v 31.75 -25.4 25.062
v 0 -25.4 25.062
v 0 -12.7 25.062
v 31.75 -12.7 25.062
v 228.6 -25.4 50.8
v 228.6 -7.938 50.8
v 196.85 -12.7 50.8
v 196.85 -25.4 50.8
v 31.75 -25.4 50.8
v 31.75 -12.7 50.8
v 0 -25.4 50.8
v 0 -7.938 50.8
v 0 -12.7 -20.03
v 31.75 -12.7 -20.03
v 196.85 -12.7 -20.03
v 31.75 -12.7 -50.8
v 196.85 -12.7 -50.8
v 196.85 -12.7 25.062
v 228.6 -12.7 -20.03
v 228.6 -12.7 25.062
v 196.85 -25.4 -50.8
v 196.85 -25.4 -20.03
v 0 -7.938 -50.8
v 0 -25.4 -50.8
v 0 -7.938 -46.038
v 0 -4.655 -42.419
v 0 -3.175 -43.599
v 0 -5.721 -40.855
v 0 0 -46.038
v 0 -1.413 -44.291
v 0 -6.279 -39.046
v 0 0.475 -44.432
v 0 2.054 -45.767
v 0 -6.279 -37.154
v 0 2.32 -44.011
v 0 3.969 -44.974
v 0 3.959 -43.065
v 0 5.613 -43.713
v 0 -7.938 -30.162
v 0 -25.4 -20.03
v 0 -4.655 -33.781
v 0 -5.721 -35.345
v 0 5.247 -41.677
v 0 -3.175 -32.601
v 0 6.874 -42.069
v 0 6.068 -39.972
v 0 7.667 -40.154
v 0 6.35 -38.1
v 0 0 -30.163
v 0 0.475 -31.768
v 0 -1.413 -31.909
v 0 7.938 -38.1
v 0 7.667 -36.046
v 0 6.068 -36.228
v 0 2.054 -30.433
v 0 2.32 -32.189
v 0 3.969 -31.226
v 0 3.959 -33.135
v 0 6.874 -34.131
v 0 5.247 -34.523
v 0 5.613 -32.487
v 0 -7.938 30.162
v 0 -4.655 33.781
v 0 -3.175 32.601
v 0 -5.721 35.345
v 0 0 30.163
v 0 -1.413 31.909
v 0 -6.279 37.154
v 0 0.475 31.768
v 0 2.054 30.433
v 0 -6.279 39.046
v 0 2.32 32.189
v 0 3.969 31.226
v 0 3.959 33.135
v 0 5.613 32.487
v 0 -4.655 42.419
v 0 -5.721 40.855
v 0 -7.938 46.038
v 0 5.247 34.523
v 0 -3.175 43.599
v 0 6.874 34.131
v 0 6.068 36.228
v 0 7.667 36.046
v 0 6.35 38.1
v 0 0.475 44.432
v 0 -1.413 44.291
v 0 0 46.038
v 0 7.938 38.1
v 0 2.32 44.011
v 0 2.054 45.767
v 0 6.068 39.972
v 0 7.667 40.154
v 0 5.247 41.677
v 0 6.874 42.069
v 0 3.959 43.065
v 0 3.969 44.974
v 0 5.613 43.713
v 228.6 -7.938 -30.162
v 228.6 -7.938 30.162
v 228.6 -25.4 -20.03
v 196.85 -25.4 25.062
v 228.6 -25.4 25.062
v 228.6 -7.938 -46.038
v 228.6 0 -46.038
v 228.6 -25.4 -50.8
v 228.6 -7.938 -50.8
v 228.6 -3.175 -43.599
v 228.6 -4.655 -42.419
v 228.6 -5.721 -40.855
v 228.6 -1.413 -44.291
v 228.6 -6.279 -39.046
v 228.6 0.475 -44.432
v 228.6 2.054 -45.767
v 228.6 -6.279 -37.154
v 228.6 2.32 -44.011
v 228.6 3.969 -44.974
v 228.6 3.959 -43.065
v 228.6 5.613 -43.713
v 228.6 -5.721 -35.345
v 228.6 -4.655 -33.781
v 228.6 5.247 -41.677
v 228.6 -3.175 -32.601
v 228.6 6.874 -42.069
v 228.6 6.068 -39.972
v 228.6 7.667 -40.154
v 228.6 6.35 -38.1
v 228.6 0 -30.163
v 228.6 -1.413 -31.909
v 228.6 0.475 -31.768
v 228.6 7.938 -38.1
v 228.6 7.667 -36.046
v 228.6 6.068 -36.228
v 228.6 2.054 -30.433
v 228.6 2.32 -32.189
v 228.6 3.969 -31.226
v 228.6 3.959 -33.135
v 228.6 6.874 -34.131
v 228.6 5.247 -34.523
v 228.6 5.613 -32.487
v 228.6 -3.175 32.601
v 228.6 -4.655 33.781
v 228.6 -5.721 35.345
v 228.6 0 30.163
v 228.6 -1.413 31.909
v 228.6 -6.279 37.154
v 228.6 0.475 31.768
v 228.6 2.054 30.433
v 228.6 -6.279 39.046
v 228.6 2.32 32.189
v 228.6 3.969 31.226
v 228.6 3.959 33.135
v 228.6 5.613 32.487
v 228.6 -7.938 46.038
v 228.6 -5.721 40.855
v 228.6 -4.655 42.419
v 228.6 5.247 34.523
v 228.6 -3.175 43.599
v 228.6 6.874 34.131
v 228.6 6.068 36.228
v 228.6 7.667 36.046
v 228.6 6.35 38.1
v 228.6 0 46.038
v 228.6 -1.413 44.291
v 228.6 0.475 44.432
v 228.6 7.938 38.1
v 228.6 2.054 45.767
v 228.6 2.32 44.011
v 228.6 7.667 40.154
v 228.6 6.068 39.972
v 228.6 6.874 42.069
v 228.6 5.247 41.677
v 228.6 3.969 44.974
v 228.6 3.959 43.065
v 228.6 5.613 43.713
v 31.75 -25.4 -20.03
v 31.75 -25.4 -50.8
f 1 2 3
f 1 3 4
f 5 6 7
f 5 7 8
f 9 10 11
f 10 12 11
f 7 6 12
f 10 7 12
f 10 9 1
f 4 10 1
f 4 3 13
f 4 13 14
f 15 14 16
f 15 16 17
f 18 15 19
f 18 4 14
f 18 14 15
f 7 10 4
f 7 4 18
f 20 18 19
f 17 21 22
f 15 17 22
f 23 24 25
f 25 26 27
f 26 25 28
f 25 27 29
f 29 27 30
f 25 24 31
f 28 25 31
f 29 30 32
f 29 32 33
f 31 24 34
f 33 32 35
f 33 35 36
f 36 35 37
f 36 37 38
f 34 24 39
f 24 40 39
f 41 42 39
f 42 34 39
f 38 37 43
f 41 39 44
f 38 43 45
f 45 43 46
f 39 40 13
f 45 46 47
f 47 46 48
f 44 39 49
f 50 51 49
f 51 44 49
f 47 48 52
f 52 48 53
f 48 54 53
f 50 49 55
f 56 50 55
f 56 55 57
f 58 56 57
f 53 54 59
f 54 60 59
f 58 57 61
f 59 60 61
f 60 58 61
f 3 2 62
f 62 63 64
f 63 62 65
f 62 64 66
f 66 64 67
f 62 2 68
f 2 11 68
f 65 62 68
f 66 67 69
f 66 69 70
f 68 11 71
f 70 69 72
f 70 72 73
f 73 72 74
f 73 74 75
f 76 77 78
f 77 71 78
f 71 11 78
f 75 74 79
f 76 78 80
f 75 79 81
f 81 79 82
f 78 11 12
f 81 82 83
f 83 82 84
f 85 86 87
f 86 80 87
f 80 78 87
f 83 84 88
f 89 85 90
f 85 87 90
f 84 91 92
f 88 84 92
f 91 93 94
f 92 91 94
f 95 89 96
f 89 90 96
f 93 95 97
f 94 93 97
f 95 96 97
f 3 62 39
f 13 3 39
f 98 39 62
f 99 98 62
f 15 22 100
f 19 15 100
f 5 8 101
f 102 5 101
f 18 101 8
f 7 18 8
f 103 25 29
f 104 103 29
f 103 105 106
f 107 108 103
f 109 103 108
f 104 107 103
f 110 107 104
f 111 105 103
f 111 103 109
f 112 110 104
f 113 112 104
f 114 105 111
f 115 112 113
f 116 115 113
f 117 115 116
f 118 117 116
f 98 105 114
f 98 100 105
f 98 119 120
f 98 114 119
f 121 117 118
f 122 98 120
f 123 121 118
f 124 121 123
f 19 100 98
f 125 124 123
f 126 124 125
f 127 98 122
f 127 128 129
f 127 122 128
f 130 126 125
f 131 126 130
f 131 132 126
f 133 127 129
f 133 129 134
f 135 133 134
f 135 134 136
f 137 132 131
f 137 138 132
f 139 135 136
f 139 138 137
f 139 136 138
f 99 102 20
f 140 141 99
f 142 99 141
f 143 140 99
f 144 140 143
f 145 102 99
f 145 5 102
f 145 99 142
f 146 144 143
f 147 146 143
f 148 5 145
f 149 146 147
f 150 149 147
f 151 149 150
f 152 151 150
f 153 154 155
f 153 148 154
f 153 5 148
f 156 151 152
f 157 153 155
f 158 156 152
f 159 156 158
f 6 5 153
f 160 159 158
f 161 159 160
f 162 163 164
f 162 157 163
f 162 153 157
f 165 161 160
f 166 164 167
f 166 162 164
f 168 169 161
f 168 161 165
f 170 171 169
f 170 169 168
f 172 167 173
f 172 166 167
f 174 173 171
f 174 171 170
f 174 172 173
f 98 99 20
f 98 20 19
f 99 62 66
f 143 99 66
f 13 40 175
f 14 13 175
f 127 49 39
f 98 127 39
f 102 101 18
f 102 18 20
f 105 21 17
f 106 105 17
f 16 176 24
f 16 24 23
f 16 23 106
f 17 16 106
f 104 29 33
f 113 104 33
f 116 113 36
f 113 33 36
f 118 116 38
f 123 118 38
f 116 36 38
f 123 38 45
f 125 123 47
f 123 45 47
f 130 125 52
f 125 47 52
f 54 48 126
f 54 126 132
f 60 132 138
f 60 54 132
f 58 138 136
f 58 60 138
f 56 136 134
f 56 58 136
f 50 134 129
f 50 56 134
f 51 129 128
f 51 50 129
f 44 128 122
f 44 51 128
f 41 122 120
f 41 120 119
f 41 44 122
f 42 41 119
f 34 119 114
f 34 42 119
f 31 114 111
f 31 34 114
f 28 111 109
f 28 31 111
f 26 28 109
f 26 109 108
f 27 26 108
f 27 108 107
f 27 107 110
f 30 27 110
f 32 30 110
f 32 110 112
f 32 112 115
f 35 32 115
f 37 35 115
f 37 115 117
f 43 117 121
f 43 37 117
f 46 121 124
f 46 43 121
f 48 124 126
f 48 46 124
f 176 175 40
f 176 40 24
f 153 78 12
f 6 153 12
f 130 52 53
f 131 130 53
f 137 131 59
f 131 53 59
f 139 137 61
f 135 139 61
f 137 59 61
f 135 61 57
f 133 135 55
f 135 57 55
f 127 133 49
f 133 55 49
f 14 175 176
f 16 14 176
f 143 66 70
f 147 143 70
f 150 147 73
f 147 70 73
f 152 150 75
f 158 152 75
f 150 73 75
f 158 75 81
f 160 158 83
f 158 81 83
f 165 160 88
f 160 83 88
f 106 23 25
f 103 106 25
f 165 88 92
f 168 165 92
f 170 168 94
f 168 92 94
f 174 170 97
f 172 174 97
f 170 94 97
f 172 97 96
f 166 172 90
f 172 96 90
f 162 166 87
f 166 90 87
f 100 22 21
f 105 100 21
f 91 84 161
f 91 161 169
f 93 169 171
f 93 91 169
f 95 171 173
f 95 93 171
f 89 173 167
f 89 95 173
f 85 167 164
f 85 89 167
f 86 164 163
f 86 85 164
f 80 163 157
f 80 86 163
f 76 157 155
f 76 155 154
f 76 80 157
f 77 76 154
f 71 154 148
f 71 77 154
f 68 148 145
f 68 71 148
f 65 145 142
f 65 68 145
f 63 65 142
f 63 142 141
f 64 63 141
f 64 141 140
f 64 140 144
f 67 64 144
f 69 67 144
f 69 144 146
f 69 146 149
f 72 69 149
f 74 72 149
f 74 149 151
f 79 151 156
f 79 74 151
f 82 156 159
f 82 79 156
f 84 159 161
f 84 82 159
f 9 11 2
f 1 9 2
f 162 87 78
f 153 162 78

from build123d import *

# Parameters (mm, degrees)
F0_R     = 6.35
F1_DEPTH = 228.6
F2_W     = 165.1
F2_H     = 25.7380759895
F2_H_2   = 10.3431178749
F2_H_3   = 45.0917202979
F2_H_4   = 30.7702037126
F2_H_5   = 15.0568821251
F2_W_2   = 31.75
F3_DEPTH = 12.7


with BuildPart() as f1:
    # F0 (on Right) → F1 (new body)
    with BuildSketch(Plane.YZ):
        with BuildLine():
            ThreePointArc((0, 30.1625), (-7.9375, 38.1), (0, 46.0375))
            Line((0, 46.0375), (-7.9375, 46.0375))
            Line((-7.9375, 46.0375), (-7.9375, 50.8))
            Line((-7.9375, 50.8), (-25.4, 50.8))
            Line((-25.4, 50.8), (-25.4, -50.8))
            Line((-25.4, -50.8), (-7.9375, -50.8))
            Line((-7.9375, -50.8), (-7.9375, -46.0375))
            Line((-7.9375, -46.0375), (0, -46.0375))
            ThreePointArc((0, -46.0375), (-7.9375, -38.1), (0, -30.1625))
            Line((0, -30.1625), (-7.9375, -30.1625))
            Line((-7.9375, -30.1625), (-7.9375, 30.1625))
            Line((-7.9375, 30.1625), (0, 30.1625))
        make_face()
        with BuildLine():
            ThreePointArc((7.9375, -38.1), (5.6126600757, -32.4873399243), (0, -30.1625))
            ThreePointArc((0, -30.1625), (-7.9375, -38.1), (0, -46.0375))
            ThreePointArc((0, -46.0375), (5.6126600757, -43.7126600757), (7.9375, -38.1))
        make_face()
        with Locations((0, -38.1)):
            Circle(F0_R, mode=Mode.SUBTRACT)
        with BuildLine():
            ThreePointArc((0, 30.1625), (5.6126600757, 32.4873399243), (7.9375, 38.1))
            ThreePointArc((7.9375, 38.1), (5.6126600757, 43.7126600757), (0, 46.0375))
            ThreePointArc((0, 46.0375), (-7.9375, 38.1), (0, 30.1625))
        make_face()
        with Locations((0, 38.1)):
            Circle(F0_R, mode=Mode.SUBTRACT)
    extrude(amount=F1_DEPTH)

    # F2 (on face) → F3 (cut)
    with BuildSketch(Plane.XZ.offset(25.4)):
        with Locations((114.3, 37.9309620053)):
            Rectangle(F2_W, F2_H)
        with Locations((114.3, 55.9715589374)):
            Rectangle(F2_W, F2_H_2)
        with Locations((114.3, 2.5160638615)):
            Rectangle(F2_W, F2_H_3)
        with Locations((114.3, -35.4148981437)):
            Rectangle(F2_W, F2_H_4)
        with Locations((114.3, -58.3284410626)):
            Rectangle(F2_W, F2_H_5)
        with Locations((15.875, 2.5160638615)):
            Rectangle(F2_W_2, F2_H_3)
        with Locations((212.725, 2.5160638615)):
            Rectangle(F2_W_2, F2_H_3)
    extrude(amount=-F3_DEPTH, mode=Mode.SUBTRACT)


solid = f1.part
